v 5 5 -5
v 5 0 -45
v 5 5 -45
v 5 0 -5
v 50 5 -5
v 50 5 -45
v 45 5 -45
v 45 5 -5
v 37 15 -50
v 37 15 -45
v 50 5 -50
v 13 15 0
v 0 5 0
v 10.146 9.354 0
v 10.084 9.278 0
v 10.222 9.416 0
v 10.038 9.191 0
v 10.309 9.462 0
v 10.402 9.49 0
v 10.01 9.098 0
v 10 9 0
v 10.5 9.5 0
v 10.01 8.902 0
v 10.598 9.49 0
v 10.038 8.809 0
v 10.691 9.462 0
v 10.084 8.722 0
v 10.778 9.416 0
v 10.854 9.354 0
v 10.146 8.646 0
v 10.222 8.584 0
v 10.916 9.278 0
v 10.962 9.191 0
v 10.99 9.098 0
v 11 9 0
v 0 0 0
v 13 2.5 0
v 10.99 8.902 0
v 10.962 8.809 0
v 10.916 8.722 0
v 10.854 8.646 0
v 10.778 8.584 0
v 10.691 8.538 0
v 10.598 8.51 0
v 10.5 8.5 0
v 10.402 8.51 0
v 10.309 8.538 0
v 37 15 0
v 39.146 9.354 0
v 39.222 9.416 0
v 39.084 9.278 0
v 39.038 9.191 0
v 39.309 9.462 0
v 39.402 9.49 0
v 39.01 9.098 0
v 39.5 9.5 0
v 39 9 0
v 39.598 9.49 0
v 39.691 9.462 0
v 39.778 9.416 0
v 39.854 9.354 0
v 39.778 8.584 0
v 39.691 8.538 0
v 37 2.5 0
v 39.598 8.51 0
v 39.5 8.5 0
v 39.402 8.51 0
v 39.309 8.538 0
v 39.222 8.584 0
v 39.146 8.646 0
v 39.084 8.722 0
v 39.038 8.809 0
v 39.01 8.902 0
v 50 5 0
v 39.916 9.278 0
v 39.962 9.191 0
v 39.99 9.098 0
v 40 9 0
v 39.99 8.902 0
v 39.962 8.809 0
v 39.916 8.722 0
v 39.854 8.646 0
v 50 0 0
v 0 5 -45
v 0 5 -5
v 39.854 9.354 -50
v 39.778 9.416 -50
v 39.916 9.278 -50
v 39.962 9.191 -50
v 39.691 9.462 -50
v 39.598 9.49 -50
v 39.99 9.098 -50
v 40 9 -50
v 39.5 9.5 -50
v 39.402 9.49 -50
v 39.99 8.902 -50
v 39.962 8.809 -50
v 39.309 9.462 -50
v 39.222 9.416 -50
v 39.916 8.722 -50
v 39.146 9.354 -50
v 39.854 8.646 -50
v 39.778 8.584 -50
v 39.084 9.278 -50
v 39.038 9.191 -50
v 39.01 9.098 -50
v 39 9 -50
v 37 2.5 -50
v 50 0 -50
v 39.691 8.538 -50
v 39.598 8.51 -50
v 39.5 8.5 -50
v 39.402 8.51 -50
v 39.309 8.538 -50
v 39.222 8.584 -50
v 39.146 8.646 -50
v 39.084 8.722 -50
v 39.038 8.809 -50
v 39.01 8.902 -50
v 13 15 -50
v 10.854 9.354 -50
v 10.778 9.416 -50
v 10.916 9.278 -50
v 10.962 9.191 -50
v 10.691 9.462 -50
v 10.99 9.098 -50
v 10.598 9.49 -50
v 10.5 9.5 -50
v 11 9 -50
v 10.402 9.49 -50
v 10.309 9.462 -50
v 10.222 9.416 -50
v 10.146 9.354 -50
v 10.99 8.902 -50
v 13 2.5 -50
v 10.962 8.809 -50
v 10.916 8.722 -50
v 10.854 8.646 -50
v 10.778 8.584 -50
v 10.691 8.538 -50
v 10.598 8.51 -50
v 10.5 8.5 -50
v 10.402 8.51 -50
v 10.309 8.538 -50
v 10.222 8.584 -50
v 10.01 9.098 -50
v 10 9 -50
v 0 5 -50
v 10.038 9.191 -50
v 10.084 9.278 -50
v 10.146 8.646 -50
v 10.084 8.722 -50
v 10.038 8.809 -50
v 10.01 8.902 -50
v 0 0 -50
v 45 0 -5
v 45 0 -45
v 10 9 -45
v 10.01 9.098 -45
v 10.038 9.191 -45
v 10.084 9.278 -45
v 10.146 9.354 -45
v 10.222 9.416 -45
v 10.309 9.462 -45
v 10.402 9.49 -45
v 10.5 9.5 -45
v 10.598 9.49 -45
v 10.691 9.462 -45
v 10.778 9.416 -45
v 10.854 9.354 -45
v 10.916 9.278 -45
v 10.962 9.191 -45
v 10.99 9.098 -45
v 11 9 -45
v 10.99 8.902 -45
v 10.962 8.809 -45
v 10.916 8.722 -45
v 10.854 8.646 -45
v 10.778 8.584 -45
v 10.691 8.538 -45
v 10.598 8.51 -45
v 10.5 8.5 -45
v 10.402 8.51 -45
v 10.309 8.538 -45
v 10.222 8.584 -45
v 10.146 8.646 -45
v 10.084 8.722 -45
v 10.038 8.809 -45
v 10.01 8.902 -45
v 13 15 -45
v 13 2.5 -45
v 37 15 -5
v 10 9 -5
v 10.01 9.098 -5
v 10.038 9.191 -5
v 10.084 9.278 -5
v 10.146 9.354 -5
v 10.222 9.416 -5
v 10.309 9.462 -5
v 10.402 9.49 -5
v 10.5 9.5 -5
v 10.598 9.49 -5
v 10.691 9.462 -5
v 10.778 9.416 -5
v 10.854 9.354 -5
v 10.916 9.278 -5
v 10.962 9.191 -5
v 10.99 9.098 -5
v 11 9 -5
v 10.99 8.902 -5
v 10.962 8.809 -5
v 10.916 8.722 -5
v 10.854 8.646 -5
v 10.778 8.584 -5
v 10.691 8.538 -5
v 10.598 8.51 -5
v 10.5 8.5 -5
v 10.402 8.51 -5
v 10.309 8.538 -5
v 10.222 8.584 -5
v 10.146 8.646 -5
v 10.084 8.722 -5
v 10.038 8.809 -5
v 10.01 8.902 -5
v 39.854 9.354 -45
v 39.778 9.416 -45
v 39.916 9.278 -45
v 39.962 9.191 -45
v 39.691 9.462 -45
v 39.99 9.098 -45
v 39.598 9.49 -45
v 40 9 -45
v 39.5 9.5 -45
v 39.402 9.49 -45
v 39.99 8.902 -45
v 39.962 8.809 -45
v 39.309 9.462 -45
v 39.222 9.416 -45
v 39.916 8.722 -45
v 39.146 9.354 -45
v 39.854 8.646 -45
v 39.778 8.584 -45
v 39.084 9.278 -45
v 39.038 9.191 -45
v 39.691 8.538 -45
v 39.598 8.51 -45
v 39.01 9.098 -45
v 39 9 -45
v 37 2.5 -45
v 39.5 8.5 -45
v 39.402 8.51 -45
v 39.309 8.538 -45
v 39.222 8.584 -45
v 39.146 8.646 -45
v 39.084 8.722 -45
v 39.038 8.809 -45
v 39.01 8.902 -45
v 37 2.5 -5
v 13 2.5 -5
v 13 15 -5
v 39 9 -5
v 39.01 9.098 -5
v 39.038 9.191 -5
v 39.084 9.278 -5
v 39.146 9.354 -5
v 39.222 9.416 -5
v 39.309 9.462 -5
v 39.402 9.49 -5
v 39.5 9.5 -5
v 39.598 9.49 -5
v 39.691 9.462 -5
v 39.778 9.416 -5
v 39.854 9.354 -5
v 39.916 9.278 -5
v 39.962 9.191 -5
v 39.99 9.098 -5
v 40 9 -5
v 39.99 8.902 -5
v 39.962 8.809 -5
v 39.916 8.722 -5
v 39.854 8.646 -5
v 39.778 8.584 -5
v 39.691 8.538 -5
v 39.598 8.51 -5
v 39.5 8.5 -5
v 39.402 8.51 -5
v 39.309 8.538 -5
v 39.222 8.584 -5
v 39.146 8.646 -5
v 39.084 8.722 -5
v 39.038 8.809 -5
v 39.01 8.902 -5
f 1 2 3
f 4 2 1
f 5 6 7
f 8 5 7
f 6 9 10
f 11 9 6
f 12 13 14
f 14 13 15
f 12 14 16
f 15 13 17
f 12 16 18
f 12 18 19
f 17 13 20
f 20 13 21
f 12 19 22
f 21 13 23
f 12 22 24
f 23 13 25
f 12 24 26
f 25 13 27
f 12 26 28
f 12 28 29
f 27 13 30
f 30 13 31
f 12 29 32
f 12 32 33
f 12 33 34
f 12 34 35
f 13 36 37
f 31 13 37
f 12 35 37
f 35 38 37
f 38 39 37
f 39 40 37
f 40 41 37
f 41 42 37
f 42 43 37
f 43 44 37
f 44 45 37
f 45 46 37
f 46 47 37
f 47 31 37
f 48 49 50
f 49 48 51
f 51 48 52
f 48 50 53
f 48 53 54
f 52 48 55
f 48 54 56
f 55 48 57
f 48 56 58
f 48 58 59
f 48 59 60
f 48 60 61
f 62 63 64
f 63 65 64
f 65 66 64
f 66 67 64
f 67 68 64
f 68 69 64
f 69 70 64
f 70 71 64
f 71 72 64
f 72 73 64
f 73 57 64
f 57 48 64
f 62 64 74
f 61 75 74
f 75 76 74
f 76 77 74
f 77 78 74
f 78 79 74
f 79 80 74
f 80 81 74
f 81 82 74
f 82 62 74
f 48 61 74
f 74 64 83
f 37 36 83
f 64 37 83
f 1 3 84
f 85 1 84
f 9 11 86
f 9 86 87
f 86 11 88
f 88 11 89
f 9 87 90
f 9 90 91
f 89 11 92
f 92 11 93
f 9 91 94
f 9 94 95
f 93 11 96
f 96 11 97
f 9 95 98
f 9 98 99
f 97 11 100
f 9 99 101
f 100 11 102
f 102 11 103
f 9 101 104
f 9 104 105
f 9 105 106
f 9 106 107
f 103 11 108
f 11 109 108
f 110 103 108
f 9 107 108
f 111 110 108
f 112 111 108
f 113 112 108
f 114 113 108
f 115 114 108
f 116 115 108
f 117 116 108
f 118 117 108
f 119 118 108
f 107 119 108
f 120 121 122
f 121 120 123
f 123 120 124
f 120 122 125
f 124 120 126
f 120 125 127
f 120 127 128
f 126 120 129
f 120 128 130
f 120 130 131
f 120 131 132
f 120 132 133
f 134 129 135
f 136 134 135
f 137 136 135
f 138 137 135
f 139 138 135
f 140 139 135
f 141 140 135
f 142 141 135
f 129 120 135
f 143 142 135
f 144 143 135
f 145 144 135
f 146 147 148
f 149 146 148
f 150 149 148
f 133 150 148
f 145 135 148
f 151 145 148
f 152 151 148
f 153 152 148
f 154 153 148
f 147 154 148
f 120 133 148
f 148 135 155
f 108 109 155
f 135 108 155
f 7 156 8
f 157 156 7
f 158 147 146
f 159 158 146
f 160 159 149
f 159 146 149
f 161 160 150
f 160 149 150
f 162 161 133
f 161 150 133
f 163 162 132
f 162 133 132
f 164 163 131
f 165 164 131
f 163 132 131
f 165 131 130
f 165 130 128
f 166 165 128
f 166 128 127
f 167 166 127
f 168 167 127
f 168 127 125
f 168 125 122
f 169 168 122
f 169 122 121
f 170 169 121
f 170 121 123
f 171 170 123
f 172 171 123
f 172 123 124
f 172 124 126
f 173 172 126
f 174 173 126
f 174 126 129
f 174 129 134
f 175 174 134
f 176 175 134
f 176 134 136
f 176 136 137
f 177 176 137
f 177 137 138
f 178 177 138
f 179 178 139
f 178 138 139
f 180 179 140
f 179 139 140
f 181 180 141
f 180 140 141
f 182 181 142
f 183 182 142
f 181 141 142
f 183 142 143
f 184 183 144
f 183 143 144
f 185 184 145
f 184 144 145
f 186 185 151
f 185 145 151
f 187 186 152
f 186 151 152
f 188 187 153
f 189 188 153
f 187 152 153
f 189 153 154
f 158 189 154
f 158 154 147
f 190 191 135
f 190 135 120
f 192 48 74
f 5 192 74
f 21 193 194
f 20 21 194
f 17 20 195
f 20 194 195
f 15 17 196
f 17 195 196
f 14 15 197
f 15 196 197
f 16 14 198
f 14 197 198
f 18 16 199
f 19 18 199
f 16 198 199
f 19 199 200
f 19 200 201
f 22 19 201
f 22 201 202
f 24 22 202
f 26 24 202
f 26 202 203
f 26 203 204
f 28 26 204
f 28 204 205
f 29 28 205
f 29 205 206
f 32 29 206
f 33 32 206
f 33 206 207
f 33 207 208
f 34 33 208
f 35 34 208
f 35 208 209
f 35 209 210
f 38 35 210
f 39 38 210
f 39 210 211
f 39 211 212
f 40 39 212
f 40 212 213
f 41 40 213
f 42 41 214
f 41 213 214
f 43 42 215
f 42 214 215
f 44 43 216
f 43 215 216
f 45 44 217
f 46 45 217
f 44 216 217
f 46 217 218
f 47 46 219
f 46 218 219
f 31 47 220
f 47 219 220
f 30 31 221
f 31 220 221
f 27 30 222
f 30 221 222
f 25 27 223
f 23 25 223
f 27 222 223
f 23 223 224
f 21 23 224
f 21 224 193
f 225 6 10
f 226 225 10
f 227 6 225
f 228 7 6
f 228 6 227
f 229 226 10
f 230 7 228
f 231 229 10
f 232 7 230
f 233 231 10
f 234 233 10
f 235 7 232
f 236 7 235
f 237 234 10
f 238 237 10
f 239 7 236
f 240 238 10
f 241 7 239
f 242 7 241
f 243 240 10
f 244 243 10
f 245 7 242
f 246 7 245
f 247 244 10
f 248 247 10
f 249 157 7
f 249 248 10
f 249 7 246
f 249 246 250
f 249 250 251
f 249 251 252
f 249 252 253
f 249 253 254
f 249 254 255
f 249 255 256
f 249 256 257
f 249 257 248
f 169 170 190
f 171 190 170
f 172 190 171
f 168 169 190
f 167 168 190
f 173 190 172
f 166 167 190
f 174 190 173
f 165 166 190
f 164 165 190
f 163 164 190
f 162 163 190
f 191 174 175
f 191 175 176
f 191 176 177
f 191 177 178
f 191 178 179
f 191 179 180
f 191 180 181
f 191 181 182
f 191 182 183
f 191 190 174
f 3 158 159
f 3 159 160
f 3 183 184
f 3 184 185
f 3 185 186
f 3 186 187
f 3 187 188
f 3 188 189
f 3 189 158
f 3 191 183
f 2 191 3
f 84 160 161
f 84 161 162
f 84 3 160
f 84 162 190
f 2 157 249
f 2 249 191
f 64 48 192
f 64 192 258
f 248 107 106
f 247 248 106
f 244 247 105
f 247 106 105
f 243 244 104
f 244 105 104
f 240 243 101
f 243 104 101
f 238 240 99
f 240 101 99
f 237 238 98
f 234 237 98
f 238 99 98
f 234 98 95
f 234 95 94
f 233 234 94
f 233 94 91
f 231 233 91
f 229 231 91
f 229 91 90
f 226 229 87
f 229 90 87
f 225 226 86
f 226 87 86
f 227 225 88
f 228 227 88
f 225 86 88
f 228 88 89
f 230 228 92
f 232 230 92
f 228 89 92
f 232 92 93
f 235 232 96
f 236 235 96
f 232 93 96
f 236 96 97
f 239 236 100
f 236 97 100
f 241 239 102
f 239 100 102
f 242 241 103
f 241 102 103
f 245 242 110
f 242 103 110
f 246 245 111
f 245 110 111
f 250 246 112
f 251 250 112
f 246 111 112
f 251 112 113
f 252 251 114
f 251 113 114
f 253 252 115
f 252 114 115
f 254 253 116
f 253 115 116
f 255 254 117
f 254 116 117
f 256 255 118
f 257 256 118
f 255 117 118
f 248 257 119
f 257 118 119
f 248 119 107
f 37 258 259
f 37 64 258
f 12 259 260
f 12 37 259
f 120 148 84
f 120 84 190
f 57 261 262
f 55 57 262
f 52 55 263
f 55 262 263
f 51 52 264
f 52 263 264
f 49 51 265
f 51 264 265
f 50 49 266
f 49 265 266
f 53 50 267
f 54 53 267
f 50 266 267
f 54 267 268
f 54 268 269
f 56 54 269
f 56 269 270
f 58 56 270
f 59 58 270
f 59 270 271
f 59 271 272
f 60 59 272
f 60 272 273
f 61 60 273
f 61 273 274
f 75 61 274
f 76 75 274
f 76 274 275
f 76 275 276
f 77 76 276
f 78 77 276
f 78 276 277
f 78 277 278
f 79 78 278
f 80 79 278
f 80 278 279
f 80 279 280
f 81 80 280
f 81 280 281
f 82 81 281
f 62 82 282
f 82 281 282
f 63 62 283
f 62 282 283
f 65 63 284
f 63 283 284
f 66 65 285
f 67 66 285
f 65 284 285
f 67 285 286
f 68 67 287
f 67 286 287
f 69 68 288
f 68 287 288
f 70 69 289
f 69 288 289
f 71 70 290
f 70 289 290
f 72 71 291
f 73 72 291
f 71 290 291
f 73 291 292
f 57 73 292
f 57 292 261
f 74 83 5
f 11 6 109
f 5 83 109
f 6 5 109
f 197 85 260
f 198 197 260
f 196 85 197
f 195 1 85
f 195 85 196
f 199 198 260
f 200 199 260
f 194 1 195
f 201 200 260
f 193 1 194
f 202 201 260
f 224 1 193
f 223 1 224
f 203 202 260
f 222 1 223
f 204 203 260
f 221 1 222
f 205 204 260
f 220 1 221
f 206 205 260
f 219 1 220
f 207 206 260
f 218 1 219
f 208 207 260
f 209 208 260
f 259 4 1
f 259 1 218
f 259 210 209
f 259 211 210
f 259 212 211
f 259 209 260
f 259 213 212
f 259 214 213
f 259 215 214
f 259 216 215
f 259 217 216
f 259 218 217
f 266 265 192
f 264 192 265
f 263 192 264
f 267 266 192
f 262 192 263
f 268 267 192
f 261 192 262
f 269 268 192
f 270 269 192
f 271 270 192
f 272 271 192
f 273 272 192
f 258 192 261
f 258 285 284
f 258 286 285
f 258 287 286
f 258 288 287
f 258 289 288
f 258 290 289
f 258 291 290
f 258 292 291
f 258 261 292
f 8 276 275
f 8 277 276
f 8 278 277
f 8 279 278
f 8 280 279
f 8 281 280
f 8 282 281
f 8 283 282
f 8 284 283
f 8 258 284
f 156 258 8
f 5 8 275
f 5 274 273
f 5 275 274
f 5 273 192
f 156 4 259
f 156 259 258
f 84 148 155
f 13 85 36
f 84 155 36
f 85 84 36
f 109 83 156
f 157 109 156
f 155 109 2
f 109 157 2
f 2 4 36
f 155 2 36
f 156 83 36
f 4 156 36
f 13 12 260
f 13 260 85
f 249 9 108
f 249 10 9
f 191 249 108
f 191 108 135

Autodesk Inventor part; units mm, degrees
ref_plane "YZ Plane" through (0, 0, 0) normal (1, 0, 0) x (0, 1, 0)
ref_plane "XZ Plane" through (0, 0, 0) normal (0, 1, 0) x (-1, 0, 0)
ref_plane "XY Plane" through (0, 0, 0) normal (0, 0, 1) x (1, 0, 0)
sketch "Sketch1" plane through (0, 0, 0) normal (0, 1, 0) x (-1, 0, 0)
  line L0 (0, 0) -> (-50, 0)
  line L1 (-50, 0) -> (-50, -50)
  line L2 (-50, -50) -> (0, -50)
  line L3 (0, -50) -> (0, 0)
  line L4 (-5, -5) -> (-45, -5)
  line L5 (-45, -5) -> (-45, -45)
  line L6 (-45, -45) -> (-5, -45)
  line L7 (-5, -45) -> (-5, -5)
  dimension "d0" = 50
  dimension "d1" = 50
  dimension "d2" = 5
extrude "Extrusion1" add sketch "Sketch1" along normal blind 5
sketch "Sketch2" plane through (0, 0, 0) normal (0, 0, 1) x (1, 0, 0)
  line L0 (0, 5) -> (50, 5) projected
  line L1 (13, 5) -> (37, 5)
  line L2 (37, 5) -> (37, 2.5)
  line L3 (37, 2.5) -> (13, 2.5)
  line L4 (13, 2.5) -> (13, 5)
  line L5 (0, 0) -> (50, 0) projected
  line L6 (0, 0) -> (0, 5) projected
  dimension "d5" = 24
  dimension "d6" = 2.5
  dimension "d7" = 13
extrude "Extrusion2" cut sketch "Sketch2" against normal through all
sketch "Sketch3" plane through (0, 0, 0) normal (0, 0, 1) x (1, 0, 0)
  line L0 (13, 2.5) -> (13, 5) projected
  line L1 (13, 5) -> (13, 15)
  line L2 (13, 5) -> (0, 5) projected
  line L3 (13, 15) -> (0, 5)
  line L4 (37, 5) -> (37, 2.5) projected
  line L5 (37, 5) -> (37, 15)
  line L6 (50, 5) -> (37, 5) projected
  line L7 (37, 15) -> (50, 5)
  point P0 (0, 0)
  dimension "d10" = 10
  dimension "d11" = 10
extrude "Extrusion3" add sketch "Sketch3" against normal blind 5
sketch "Sketch4" plane through (50, 0, -50) normal (0, 0, -1) x (-1, 0, 0)
  line L0 (50, 5) -> (37, 15) projected
  line L1 (37, 15) -> (37, 2.5) projected
  line L2 (13, 15) -> (0, 5) projected
  line L3 (13, 2.5) -> (13, 15) projected
  line L4 (0, 5) -> (13, 15)
  line L5 (13, 5) -> (5, 5) projected
  line L6 (13, 15) -> (13, 5)
  line L7 (0, 5) -> (13, 5) projected
  line L8 (13, 5) -> (0, 5)
  line L9 (50, 5) -> (45, 5) projected
  line L10 (50, 5) -> (37, 15)
  line L11 (45, 5) -> (37, 5) projected
  line L12 (37, 15) -> (37, 5)
  line L13 (37, 5) -> (50, 5)
  point P0 (50, 0)
extrude "Extrusion4" add sketch "Sketch4" against normal blind 5
sketch "Sketch5" plane through (50, 0, -50) normal (0, 0, -1) x (-1, 0, 0)
  circle A0 centre (39.5, 9) radius 0.5
  circle A1 centre (10.5, 9) radius 0.5
  line L0 (37, 2.5) -> (13, 2.5) projected
  line L1 (37, 15) -> (37, 2.5) projected
  line L2 (13, 2.5) -> (13, 15) projected
  point P0 (50, 0)
  dimension "d16" = 6.5
  dimension "d17" = 6.5
  dimension "d18" = 1
  dimension "d19" = 1
  dimension "d20" = 2.5
  dimension "d21" = 2.5
sketch "Sketch6" plane through (50, 0, -50) normal (0, 0, -1) x (-1, 0, 0)
  point P0 (50, 0)
extrude "Extrusion5" cut sketch "Sketch5" against normal through all
properties part number "MotorMountForPrograming"
